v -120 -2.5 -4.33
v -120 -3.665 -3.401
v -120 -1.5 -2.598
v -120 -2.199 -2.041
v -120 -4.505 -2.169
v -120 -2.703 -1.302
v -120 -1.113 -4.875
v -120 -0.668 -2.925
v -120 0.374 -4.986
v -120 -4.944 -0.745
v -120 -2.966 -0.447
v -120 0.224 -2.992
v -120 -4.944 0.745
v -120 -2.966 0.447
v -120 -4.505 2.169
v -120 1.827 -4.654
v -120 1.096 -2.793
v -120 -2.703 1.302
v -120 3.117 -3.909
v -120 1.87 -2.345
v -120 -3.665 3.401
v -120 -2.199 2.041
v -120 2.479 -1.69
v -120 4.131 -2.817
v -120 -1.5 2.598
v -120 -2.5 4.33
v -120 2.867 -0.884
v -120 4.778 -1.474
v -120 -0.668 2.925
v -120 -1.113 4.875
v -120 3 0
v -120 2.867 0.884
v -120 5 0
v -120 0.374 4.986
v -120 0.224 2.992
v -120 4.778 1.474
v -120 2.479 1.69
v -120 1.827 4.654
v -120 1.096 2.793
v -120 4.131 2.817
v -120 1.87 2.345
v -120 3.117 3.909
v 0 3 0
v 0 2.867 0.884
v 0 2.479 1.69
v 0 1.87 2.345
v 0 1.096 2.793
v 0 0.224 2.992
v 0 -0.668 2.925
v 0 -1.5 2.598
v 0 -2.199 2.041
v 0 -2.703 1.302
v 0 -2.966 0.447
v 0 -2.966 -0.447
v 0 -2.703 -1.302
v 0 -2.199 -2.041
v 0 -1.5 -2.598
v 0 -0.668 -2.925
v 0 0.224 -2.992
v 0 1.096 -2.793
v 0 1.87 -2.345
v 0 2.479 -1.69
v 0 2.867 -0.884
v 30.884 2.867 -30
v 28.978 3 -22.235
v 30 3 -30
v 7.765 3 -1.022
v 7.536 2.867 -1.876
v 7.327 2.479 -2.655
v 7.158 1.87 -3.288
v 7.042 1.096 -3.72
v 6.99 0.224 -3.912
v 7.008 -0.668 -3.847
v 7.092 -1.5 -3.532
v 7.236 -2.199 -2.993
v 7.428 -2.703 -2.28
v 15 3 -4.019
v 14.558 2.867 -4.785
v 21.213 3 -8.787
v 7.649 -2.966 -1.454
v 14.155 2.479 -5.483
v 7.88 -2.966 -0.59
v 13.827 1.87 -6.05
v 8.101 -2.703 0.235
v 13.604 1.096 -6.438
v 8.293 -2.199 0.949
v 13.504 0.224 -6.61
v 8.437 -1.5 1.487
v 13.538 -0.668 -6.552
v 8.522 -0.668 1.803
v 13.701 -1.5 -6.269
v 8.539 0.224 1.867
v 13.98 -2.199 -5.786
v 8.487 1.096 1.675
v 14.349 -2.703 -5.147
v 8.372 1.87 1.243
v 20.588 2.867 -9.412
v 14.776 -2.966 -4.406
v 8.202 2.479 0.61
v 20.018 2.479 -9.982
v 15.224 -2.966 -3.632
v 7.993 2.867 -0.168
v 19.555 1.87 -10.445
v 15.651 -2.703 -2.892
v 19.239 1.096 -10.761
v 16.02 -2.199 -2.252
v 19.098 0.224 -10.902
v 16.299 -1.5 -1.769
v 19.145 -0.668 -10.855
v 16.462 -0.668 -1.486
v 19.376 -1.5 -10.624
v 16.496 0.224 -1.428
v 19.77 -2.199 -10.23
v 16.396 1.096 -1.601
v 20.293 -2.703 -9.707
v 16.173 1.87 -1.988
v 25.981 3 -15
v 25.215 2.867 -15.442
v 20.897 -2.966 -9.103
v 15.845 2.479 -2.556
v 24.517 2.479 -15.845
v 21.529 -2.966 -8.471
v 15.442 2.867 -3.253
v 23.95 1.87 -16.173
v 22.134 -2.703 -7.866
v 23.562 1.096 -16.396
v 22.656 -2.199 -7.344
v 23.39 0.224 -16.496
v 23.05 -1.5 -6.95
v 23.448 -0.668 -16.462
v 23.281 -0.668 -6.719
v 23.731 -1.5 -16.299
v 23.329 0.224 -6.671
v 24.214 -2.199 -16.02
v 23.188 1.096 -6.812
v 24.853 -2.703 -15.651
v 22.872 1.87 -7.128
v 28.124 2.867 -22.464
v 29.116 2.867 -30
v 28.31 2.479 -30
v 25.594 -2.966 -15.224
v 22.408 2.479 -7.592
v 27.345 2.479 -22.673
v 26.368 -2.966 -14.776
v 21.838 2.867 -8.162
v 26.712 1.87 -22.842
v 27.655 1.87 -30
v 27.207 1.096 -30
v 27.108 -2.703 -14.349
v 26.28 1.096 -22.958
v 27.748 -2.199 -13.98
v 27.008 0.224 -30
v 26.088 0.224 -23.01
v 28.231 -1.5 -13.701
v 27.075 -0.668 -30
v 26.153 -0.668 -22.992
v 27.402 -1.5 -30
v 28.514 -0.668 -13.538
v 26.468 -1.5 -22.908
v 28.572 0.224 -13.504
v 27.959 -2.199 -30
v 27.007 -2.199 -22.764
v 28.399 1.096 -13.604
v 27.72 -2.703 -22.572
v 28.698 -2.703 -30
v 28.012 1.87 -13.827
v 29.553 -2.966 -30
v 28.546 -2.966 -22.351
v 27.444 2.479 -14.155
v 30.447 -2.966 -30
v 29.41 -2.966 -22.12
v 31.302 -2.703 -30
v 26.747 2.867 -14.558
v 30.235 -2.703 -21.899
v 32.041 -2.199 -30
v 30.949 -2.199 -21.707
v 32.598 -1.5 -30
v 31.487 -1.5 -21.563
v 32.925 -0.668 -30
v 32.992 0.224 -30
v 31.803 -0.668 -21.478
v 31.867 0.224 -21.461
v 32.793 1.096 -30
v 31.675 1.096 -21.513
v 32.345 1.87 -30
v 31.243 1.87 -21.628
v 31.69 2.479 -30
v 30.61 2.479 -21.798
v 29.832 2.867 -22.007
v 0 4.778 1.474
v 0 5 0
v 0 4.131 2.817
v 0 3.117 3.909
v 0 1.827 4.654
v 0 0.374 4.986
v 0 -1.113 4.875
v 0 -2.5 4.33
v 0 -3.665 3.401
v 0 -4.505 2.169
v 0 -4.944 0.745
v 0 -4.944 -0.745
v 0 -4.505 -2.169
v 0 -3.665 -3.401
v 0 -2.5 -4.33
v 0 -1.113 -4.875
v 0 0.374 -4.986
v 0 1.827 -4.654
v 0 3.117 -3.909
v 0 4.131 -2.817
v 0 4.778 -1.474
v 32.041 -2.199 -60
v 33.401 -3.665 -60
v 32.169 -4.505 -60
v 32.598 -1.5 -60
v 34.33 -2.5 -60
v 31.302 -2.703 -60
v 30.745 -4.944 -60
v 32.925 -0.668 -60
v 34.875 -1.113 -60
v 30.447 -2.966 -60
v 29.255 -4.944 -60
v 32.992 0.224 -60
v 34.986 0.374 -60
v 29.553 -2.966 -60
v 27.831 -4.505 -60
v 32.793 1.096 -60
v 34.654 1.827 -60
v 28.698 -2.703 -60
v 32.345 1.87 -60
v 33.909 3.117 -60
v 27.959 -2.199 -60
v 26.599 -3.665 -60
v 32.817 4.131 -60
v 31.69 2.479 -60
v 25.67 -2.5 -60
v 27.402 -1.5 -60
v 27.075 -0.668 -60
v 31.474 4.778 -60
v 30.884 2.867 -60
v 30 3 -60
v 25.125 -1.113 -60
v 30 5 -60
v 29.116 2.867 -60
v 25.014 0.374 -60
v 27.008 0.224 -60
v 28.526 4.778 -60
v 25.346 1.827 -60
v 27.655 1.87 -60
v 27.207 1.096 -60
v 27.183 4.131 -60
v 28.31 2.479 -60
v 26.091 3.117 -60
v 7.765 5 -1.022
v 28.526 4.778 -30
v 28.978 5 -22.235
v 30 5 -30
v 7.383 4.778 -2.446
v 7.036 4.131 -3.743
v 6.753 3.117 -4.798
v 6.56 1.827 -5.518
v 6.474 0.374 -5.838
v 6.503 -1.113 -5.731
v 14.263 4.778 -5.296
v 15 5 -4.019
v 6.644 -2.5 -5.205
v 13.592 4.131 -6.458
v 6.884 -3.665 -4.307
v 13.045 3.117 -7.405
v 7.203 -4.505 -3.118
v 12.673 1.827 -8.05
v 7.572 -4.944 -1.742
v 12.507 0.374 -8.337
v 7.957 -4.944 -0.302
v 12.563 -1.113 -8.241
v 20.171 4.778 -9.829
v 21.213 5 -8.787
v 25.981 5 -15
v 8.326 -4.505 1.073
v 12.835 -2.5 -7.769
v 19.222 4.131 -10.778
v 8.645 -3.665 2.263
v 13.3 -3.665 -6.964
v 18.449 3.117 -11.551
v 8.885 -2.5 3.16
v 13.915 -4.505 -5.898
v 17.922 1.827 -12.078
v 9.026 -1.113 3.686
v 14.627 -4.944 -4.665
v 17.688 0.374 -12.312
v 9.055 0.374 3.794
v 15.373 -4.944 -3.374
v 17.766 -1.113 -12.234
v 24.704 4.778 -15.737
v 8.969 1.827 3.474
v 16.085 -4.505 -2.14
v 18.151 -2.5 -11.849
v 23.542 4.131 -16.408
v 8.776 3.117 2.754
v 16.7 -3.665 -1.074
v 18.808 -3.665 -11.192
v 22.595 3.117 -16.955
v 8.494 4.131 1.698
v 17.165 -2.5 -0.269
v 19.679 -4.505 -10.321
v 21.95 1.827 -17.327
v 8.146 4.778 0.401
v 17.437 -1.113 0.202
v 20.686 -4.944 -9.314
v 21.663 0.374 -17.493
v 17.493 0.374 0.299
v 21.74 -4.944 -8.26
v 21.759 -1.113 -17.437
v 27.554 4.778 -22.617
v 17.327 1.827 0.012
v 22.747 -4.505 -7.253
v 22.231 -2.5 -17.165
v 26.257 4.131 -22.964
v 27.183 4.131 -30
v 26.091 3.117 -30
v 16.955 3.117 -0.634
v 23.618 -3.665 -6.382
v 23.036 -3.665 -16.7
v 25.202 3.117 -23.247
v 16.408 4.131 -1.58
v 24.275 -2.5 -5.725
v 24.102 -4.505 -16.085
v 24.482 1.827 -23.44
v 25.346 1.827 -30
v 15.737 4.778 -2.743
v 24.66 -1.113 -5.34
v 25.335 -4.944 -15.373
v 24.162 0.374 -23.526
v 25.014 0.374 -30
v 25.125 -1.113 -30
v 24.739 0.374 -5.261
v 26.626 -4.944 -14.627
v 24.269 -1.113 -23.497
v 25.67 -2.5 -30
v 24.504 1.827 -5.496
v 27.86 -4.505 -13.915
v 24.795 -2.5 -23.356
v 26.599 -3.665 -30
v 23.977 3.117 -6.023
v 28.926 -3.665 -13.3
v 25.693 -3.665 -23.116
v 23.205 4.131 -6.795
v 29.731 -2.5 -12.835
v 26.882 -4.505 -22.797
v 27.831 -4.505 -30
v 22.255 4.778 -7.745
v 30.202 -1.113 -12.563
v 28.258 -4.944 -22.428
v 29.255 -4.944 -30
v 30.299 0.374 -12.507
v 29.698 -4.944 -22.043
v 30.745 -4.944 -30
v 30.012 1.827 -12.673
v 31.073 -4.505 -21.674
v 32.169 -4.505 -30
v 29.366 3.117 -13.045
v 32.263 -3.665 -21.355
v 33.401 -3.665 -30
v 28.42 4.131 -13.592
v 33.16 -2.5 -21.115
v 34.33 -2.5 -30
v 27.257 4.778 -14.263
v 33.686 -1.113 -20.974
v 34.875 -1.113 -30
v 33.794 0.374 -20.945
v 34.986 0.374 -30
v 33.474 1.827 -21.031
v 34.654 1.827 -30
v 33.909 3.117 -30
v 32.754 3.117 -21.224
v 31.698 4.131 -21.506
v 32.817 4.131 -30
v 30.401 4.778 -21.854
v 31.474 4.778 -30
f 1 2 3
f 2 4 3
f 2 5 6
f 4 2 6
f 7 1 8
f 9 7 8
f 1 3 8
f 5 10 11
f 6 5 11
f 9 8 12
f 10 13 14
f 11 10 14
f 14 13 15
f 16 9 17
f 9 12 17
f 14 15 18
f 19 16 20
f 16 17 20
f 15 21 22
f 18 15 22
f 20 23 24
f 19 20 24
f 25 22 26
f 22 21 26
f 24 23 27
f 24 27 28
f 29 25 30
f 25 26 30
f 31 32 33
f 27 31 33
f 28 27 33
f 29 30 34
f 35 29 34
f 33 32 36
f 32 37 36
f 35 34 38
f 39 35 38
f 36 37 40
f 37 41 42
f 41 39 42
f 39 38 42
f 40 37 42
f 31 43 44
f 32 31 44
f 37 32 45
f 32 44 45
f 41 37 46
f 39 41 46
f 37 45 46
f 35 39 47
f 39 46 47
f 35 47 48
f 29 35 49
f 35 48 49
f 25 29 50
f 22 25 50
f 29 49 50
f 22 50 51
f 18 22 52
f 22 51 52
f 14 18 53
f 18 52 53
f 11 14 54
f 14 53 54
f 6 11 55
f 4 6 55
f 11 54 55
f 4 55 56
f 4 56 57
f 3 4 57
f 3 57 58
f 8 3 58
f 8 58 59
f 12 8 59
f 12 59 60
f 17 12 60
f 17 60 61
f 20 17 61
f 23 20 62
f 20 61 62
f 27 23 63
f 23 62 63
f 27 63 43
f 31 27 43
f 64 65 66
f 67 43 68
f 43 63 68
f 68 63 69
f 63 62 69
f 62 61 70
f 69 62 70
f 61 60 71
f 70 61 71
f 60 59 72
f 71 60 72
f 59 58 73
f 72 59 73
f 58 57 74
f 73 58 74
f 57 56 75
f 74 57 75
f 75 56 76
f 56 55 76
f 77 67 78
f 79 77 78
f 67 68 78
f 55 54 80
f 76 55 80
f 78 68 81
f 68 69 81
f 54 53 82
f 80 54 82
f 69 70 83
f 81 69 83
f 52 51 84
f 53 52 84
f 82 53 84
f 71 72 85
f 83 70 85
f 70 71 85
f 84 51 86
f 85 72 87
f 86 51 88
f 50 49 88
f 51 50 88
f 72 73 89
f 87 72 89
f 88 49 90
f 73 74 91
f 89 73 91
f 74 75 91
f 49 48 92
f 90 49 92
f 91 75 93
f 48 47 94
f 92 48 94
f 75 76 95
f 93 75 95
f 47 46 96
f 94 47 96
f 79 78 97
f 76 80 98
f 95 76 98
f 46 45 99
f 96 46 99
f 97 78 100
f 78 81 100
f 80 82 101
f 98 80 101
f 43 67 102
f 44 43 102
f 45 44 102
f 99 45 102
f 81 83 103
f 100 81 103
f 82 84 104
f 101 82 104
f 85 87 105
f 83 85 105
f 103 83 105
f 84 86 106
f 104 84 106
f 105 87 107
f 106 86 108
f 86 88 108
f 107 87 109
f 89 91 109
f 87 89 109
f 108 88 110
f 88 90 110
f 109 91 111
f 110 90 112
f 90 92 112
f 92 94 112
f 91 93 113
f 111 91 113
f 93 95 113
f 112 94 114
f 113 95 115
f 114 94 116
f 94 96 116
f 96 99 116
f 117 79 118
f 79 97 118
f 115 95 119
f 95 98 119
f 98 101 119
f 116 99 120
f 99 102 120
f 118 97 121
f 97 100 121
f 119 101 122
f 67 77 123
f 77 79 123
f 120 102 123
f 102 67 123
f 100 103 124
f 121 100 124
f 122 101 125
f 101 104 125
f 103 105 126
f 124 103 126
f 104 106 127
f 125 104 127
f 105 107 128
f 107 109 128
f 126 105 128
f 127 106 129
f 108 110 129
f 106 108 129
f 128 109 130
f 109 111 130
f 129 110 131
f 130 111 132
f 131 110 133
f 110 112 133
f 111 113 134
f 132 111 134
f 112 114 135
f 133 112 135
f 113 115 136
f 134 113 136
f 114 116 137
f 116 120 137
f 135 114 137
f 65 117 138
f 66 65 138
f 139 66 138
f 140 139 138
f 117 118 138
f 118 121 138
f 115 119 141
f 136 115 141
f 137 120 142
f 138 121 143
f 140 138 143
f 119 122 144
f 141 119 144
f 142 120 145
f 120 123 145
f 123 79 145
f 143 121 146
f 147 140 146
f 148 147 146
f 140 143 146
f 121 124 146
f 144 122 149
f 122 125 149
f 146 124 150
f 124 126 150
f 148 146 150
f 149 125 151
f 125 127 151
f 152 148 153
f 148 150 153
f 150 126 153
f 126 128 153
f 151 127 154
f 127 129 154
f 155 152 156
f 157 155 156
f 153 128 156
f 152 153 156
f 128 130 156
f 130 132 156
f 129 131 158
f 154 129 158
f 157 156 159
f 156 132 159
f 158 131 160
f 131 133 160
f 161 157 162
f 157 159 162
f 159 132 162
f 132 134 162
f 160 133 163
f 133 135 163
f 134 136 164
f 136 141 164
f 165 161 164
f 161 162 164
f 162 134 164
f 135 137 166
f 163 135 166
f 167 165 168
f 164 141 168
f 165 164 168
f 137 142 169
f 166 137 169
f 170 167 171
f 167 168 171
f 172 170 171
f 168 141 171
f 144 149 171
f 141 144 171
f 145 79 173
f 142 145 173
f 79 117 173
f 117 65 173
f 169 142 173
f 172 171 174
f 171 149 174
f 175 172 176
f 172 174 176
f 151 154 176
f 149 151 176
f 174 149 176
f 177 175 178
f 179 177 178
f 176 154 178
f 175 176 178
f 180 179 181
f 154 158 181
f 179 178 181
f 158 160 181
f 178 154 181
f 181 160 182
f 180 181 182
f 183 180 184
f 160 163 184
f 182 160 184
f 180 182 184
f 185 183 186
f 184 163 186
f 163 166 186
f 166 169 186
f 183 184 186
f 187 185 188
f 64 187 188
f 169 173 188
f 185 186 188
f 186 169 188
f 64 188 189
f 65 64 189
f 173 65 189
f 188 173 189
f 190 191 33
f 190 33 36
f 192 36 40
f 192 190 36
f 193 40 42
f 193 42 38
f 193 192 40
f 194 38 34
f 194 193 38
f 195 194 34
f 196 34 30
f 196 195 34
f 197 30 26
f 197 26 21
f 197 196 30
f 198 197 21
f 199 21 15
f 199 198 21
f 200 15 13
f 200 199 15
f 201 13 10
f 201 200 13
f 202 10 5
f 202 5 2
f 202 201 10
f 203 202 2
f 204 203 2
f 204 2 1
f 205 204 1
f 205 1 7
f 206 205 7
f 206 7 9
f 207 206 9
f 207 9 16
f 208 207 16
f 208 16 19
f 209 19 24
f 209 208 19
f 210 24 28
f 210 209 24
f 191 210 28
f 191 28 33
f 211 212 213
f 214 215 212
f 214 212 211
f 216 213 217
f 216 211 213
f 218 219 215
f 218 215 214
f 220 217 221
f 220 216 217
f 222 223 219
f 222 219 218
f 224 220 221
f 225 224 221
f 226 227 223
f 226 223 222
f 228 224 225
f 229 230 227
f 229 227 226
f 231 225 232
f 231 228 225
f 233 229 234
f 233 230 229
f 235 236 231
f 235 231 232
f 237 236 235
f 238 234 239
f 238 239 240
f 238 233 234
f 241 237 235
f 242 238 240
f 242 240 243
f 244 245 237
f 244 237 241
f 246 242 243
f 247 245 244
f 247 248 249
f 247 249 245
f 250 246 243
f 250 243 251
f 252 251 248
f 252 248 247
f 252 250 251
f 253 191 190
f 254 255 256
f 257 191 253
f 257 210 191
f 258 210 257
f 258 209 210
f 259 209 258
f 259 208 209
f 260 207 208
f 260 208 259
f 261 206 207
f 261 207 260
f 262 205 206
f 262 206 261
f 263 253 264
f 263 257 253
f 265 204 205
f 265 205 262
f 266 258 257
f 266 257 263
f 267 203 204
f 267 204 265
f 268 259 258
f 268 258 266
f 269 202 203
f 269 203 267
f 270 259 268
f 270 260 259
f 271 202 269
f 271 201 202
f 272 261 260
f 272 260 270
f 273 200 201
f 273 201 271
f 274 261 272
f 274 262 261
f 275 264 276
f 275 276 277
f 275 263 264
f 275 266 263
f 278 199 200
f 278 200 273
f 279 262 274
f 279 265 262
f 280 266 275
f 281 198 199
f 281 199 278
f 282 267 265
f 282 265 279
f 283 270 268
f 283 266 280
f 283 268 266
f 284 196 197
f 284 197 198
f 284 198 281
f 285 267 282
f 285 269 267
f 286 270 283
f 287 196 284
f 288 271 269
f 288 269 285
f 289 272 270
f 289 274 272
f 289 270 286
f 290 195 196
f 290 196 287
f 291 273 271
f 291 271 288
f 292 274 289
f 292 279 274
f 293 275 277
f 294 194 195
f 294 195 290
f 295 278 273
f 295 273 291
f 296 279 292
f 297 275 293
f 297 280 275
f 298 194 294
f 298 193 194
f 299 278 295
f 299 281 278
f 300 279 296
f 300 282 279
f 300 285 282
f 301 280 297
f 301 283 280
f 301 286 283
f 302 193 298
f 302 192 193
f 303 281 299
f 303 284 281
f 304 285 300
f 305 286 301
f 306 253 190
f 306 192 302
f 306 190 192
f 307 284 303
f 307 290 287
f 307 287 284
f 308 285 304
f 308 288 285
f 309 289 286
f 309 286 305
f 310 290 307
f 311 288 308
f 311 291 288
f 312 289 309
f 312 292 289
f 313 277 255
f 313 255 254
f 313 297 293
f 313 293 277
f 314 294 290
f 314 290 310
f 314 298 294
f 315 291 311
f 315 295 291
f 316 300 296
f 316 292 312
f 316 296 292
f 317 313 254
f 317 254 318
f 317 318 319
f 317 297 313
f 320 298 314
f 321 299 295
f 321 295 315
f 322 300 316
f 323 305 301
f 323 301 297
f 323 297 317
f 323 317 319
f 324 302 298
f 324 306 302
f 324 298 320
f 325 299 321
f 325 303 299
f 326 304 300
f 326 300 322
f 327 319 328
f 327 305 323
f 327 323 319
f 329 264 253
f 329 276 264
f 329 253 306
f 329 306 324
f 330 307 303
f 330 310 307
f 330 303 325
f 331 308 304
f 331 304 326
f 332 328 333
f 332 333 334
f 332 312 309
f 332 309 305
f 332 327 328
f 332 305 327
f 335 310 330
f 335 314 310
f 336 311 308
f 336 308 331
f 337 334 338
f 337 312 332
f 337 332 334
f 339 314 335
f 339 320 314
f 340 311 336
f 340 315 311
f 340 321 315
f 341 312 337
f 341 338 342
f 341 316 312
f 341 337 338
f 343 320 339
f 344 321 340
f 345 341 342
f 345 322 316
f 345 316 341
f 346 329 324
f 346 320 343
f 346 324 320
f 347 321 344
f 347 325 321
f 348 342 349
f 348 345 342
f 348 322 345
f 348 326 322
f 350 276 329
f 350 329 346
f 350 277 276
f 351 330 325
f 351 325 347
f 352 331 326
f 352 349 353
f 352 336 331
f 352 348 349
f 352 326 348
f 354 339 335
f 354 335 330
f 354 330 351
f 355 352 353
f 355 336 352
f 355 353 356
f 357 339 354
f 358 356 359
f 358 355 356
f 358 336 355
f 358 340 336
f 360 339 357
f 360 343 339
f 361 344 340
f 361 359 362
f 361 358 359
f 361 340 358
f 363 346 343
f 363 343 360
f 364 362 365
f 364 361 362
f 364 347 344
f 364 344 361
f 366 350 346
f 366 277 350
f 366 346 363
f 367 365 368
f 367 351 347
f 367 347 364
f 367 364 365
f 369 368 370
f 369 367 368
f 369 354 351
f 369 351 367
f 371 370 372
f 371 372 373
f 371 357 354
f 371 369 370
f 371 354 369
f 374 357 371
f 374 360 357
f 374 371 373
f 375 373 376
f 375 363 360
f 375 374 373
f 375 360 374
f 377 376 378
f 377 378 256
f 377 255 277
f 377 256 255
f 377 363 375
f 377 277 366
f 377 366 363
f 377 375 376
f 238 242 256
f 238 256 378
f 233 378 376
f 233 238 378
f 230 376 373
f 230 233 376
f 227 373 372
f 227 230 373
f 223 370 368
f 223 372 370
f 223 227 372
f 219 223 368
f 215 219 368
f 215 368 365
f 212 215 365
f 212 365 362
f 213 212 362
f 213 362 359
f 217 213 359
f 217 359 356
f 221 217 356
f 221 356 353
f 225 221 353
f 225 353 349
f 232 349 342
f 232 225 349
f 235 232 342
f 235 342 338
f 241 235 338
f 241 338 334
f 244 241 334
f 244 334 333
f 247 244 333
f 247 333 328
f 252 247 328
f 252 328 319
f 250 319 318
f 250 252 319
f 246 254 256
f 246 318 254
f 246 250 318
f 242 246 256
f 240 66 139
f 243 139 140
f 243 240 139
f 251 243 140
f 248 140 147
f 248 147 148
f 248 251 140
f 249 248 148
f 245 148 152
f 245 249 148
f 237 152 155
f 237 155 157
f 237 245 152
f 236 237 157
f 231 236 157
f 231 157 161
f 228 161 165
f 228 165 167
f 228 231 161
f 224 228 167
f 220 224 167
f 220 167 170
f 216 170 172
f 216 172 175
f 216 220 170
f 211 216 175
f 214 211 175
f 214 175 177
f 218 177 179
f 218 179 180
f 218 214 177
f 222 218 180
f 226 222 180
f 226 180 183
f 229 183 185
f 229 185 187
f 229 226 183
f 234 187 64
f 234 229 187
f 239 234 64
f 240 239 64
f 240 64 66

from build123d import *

# Parameters (mm, degrees)
F0_R        = 5
F0_R_2      = 3
F1_DEPTH    = 120
F1_FACE_R   = 5
F1_FACE_R_2 = 3


with BuildPart() as f1:
    # F0 (on Right) → F1 (new body)
    with BuildSketch(Plane.YZ):
        Circle(F0_R)
        Circle(F0_R_2, mode=Mode.SUBTRACT)
    extrude(amount=-F1_DEPTH)

    # F3: sweep along a path in F2
    with BuildLine(Plane.XZ) as f3_path:
        ThreePointArc((0, 0), (21.213203, -8.786797), (30, -30))
        Line((30, -30), (30, -60))
    # F1_face (on face) → F3 (sweep)
    with BuildSketch(Plane.YZ):
        Circle(F1_FACE_R)
        Circle(F1_FACE_R_2, mode=Mode.SUBTRACT)
    sweep(path=f3_path.line)


solid = f1.part
